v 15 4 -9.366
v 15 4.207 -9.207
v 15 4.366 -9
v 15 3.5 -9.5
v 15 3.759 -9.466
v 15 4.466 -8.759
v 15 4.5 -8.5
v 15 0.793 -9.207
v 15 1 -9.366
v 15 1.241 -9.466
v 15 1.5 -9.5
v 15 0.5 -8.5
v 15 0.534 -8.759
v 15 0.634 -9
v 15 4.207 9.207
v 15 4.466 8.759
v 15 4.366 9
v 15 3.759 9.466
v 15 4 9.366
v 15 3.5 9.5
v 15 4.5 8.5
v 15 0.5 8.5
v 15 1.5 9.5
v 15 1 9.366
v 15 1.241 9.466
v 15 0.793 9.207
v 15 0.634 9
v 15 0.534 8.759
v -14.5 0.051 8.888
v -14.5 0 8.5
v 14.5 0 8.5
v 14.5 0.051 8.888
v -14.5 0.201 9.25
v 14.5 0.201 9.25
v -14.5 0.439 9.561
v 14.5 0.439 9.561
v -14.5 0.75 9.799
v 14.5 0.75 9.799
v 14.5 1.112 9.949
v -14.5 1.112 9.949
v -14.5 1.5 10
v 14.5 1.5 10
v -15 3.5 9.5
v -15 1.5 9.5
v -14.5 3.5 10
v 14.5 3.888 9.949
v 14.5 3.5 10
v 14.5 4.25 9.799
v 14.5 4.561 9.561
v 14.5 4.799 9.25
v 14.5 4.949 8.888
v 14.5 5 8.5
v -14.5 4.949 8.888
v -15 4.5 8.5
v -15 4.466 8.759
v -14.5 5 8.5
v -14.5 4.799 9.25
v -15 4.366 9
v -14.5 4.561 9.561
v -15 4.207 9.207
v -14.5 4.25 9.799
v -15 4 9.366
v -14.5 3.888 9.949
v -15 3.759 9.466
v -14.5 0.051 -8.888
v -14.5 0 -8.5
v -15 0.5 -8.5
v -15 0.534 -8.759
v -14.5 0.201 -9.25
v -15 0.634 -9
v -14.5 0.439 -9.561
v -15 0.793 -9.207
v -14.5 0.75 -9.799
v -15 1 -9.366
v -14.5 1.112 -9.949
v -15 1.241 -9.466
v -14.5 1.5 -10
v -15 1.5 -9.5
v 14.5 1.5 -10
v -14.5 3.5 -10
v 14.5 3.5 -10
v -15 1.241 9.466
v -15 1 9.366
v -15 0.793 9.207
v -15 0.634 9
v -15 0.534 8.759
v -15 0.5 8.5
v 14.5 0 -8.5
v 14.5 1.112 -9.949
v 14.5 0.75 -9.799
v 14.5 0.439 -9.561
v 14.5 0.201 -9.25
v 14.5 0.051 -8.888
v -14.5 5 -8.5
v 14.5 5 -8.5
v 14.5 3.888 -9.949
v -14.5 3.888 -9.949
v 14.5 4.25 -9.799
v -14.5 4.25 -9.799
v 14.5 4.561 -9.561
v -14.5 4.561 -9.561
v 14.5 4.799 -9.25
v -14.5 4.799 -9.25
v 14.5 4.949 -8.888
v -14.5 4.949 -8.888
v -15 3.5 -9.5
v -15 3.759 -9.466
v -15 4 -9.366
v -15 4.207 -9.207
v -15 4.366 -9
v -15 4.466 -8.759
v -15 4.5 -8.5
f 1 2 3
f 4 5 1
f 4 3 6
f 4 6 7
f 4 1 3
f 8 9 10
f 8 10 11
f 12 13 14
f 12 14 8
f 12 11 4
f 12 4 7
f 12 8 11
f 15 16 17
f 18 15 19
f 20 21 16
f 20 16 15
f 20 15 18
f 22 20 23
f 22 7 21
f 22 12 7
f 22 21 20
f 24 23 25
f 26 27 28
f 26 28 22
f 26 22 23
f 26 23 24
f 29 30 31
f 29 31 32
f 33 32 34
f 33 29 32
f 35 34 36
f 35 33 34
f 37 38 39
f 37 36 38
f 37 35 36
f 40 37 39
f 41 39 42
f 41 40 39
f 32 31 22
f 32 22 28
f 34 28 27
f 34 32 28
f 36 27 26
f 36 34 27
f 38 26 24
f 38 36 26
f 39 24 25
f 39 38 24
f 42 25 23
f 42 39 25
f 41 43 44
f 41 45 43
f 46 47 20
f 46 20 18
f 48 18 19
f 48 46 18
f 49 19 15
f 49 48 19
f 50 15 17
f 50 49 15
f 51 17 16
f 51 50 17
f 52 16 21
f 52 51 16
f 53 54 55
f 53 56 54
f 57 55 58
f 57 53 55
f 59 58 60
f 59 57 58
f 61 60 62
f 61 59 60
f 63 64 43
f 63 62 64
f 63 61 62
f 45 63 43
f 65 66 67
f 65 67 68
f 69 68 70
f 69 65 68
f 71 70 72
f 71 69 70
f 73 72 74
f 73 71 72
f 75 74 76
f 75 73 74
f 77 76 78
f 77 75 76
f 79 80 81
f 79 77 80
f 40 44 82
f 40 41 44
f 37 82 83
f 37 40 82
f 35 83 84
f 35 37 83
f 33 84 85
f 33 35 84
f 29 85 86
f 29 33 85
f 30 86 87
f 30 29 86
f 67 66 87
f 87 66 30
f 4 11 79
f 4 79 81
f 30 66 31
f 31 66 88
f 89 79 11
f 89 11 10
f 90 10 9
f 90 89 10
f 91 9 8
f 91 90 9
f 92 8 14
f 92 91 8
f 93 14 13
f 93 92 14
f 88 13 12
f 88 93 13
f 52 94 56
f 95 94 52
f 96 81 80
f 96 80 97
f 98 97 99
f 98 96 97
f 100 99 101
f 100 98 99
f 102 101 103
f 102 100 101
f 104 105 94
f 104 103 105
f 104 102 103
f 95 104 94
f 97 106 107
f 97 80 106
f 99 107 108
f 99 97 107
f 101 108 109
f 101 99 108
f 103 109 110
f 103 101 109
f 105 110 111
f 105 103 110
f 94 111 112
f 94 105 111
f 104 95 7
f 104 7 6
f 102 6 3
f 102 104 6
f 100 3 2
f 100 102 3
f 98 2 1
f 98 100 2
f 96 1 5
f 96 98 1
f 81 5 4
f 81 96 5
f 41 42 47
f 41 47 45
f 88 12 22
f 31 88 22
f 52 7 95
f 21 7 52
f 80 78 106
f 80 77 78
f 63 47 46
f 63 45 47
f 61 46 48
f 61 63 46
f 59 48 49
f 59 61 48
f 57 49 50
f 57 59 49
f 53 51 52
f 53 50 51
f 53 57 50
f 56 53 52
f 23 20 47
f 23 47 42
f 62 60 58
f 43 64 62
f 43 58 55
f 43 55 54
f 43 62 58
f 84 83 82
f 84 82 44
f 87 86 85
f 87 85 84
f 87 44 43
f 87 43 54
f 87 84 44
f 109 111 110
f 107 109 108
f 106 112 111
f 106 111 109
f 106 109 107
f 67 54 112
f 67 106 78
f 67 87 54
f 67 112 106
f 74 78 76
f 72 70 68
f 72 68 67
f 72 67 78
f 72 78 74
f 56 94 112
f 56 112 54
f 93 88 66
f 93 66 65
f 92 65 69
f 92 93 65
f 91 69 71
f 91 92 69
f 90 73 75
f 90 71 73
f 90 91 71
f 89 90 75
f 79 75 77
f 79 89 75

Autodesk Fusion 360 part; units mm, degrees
sketch "Sketch1" plane through (0, 0, 0) normal (0, 1, 0) x (1, 0, 0)
  line L0 (-15, 10) -> (15, 10)
  line L1 (15, 10) -> (15, -10)
  line L2 (15, -10) -> (-15, -10)
  line L3 (-15, -10) -> (-15, 10)
  line L4 (-15, 10) -> (15, -10) construction
  line L5 (15, 10) -> (-15, -10) construction
  dimension "d1" = 30
  dimension "d2" = 20
extrude "Extrude1" add sketch "Sketch1" along normal blind 5
fillet "Fillet1" radius 1.5 4 edges at (0, 5, 10) (0, 0, 10) (0, 5, -10) (0, 0, -10)
chamfer "Chamfer1" distance 0.5 angle 45 16 edges at (-15, 2.5, 10) (-15, 0.4393, 9.5607) (-15, 0, 0) (-15, 0.4393, -9.5607) (-15, 2.5, -10) (-15, 4.5607, -9.5607) (-15, 5, 0) (-15, 4.5607, 9.5607) (15, 2.5, -10) (15, 0.4393, -9.5607) (15, 0, 0) (15, 0.4393, 9.5607) (15, 2.5, 10) (15, 4.5607, 9.5607) (15, 5, 0) (15, 4.5607, -9.5607)
